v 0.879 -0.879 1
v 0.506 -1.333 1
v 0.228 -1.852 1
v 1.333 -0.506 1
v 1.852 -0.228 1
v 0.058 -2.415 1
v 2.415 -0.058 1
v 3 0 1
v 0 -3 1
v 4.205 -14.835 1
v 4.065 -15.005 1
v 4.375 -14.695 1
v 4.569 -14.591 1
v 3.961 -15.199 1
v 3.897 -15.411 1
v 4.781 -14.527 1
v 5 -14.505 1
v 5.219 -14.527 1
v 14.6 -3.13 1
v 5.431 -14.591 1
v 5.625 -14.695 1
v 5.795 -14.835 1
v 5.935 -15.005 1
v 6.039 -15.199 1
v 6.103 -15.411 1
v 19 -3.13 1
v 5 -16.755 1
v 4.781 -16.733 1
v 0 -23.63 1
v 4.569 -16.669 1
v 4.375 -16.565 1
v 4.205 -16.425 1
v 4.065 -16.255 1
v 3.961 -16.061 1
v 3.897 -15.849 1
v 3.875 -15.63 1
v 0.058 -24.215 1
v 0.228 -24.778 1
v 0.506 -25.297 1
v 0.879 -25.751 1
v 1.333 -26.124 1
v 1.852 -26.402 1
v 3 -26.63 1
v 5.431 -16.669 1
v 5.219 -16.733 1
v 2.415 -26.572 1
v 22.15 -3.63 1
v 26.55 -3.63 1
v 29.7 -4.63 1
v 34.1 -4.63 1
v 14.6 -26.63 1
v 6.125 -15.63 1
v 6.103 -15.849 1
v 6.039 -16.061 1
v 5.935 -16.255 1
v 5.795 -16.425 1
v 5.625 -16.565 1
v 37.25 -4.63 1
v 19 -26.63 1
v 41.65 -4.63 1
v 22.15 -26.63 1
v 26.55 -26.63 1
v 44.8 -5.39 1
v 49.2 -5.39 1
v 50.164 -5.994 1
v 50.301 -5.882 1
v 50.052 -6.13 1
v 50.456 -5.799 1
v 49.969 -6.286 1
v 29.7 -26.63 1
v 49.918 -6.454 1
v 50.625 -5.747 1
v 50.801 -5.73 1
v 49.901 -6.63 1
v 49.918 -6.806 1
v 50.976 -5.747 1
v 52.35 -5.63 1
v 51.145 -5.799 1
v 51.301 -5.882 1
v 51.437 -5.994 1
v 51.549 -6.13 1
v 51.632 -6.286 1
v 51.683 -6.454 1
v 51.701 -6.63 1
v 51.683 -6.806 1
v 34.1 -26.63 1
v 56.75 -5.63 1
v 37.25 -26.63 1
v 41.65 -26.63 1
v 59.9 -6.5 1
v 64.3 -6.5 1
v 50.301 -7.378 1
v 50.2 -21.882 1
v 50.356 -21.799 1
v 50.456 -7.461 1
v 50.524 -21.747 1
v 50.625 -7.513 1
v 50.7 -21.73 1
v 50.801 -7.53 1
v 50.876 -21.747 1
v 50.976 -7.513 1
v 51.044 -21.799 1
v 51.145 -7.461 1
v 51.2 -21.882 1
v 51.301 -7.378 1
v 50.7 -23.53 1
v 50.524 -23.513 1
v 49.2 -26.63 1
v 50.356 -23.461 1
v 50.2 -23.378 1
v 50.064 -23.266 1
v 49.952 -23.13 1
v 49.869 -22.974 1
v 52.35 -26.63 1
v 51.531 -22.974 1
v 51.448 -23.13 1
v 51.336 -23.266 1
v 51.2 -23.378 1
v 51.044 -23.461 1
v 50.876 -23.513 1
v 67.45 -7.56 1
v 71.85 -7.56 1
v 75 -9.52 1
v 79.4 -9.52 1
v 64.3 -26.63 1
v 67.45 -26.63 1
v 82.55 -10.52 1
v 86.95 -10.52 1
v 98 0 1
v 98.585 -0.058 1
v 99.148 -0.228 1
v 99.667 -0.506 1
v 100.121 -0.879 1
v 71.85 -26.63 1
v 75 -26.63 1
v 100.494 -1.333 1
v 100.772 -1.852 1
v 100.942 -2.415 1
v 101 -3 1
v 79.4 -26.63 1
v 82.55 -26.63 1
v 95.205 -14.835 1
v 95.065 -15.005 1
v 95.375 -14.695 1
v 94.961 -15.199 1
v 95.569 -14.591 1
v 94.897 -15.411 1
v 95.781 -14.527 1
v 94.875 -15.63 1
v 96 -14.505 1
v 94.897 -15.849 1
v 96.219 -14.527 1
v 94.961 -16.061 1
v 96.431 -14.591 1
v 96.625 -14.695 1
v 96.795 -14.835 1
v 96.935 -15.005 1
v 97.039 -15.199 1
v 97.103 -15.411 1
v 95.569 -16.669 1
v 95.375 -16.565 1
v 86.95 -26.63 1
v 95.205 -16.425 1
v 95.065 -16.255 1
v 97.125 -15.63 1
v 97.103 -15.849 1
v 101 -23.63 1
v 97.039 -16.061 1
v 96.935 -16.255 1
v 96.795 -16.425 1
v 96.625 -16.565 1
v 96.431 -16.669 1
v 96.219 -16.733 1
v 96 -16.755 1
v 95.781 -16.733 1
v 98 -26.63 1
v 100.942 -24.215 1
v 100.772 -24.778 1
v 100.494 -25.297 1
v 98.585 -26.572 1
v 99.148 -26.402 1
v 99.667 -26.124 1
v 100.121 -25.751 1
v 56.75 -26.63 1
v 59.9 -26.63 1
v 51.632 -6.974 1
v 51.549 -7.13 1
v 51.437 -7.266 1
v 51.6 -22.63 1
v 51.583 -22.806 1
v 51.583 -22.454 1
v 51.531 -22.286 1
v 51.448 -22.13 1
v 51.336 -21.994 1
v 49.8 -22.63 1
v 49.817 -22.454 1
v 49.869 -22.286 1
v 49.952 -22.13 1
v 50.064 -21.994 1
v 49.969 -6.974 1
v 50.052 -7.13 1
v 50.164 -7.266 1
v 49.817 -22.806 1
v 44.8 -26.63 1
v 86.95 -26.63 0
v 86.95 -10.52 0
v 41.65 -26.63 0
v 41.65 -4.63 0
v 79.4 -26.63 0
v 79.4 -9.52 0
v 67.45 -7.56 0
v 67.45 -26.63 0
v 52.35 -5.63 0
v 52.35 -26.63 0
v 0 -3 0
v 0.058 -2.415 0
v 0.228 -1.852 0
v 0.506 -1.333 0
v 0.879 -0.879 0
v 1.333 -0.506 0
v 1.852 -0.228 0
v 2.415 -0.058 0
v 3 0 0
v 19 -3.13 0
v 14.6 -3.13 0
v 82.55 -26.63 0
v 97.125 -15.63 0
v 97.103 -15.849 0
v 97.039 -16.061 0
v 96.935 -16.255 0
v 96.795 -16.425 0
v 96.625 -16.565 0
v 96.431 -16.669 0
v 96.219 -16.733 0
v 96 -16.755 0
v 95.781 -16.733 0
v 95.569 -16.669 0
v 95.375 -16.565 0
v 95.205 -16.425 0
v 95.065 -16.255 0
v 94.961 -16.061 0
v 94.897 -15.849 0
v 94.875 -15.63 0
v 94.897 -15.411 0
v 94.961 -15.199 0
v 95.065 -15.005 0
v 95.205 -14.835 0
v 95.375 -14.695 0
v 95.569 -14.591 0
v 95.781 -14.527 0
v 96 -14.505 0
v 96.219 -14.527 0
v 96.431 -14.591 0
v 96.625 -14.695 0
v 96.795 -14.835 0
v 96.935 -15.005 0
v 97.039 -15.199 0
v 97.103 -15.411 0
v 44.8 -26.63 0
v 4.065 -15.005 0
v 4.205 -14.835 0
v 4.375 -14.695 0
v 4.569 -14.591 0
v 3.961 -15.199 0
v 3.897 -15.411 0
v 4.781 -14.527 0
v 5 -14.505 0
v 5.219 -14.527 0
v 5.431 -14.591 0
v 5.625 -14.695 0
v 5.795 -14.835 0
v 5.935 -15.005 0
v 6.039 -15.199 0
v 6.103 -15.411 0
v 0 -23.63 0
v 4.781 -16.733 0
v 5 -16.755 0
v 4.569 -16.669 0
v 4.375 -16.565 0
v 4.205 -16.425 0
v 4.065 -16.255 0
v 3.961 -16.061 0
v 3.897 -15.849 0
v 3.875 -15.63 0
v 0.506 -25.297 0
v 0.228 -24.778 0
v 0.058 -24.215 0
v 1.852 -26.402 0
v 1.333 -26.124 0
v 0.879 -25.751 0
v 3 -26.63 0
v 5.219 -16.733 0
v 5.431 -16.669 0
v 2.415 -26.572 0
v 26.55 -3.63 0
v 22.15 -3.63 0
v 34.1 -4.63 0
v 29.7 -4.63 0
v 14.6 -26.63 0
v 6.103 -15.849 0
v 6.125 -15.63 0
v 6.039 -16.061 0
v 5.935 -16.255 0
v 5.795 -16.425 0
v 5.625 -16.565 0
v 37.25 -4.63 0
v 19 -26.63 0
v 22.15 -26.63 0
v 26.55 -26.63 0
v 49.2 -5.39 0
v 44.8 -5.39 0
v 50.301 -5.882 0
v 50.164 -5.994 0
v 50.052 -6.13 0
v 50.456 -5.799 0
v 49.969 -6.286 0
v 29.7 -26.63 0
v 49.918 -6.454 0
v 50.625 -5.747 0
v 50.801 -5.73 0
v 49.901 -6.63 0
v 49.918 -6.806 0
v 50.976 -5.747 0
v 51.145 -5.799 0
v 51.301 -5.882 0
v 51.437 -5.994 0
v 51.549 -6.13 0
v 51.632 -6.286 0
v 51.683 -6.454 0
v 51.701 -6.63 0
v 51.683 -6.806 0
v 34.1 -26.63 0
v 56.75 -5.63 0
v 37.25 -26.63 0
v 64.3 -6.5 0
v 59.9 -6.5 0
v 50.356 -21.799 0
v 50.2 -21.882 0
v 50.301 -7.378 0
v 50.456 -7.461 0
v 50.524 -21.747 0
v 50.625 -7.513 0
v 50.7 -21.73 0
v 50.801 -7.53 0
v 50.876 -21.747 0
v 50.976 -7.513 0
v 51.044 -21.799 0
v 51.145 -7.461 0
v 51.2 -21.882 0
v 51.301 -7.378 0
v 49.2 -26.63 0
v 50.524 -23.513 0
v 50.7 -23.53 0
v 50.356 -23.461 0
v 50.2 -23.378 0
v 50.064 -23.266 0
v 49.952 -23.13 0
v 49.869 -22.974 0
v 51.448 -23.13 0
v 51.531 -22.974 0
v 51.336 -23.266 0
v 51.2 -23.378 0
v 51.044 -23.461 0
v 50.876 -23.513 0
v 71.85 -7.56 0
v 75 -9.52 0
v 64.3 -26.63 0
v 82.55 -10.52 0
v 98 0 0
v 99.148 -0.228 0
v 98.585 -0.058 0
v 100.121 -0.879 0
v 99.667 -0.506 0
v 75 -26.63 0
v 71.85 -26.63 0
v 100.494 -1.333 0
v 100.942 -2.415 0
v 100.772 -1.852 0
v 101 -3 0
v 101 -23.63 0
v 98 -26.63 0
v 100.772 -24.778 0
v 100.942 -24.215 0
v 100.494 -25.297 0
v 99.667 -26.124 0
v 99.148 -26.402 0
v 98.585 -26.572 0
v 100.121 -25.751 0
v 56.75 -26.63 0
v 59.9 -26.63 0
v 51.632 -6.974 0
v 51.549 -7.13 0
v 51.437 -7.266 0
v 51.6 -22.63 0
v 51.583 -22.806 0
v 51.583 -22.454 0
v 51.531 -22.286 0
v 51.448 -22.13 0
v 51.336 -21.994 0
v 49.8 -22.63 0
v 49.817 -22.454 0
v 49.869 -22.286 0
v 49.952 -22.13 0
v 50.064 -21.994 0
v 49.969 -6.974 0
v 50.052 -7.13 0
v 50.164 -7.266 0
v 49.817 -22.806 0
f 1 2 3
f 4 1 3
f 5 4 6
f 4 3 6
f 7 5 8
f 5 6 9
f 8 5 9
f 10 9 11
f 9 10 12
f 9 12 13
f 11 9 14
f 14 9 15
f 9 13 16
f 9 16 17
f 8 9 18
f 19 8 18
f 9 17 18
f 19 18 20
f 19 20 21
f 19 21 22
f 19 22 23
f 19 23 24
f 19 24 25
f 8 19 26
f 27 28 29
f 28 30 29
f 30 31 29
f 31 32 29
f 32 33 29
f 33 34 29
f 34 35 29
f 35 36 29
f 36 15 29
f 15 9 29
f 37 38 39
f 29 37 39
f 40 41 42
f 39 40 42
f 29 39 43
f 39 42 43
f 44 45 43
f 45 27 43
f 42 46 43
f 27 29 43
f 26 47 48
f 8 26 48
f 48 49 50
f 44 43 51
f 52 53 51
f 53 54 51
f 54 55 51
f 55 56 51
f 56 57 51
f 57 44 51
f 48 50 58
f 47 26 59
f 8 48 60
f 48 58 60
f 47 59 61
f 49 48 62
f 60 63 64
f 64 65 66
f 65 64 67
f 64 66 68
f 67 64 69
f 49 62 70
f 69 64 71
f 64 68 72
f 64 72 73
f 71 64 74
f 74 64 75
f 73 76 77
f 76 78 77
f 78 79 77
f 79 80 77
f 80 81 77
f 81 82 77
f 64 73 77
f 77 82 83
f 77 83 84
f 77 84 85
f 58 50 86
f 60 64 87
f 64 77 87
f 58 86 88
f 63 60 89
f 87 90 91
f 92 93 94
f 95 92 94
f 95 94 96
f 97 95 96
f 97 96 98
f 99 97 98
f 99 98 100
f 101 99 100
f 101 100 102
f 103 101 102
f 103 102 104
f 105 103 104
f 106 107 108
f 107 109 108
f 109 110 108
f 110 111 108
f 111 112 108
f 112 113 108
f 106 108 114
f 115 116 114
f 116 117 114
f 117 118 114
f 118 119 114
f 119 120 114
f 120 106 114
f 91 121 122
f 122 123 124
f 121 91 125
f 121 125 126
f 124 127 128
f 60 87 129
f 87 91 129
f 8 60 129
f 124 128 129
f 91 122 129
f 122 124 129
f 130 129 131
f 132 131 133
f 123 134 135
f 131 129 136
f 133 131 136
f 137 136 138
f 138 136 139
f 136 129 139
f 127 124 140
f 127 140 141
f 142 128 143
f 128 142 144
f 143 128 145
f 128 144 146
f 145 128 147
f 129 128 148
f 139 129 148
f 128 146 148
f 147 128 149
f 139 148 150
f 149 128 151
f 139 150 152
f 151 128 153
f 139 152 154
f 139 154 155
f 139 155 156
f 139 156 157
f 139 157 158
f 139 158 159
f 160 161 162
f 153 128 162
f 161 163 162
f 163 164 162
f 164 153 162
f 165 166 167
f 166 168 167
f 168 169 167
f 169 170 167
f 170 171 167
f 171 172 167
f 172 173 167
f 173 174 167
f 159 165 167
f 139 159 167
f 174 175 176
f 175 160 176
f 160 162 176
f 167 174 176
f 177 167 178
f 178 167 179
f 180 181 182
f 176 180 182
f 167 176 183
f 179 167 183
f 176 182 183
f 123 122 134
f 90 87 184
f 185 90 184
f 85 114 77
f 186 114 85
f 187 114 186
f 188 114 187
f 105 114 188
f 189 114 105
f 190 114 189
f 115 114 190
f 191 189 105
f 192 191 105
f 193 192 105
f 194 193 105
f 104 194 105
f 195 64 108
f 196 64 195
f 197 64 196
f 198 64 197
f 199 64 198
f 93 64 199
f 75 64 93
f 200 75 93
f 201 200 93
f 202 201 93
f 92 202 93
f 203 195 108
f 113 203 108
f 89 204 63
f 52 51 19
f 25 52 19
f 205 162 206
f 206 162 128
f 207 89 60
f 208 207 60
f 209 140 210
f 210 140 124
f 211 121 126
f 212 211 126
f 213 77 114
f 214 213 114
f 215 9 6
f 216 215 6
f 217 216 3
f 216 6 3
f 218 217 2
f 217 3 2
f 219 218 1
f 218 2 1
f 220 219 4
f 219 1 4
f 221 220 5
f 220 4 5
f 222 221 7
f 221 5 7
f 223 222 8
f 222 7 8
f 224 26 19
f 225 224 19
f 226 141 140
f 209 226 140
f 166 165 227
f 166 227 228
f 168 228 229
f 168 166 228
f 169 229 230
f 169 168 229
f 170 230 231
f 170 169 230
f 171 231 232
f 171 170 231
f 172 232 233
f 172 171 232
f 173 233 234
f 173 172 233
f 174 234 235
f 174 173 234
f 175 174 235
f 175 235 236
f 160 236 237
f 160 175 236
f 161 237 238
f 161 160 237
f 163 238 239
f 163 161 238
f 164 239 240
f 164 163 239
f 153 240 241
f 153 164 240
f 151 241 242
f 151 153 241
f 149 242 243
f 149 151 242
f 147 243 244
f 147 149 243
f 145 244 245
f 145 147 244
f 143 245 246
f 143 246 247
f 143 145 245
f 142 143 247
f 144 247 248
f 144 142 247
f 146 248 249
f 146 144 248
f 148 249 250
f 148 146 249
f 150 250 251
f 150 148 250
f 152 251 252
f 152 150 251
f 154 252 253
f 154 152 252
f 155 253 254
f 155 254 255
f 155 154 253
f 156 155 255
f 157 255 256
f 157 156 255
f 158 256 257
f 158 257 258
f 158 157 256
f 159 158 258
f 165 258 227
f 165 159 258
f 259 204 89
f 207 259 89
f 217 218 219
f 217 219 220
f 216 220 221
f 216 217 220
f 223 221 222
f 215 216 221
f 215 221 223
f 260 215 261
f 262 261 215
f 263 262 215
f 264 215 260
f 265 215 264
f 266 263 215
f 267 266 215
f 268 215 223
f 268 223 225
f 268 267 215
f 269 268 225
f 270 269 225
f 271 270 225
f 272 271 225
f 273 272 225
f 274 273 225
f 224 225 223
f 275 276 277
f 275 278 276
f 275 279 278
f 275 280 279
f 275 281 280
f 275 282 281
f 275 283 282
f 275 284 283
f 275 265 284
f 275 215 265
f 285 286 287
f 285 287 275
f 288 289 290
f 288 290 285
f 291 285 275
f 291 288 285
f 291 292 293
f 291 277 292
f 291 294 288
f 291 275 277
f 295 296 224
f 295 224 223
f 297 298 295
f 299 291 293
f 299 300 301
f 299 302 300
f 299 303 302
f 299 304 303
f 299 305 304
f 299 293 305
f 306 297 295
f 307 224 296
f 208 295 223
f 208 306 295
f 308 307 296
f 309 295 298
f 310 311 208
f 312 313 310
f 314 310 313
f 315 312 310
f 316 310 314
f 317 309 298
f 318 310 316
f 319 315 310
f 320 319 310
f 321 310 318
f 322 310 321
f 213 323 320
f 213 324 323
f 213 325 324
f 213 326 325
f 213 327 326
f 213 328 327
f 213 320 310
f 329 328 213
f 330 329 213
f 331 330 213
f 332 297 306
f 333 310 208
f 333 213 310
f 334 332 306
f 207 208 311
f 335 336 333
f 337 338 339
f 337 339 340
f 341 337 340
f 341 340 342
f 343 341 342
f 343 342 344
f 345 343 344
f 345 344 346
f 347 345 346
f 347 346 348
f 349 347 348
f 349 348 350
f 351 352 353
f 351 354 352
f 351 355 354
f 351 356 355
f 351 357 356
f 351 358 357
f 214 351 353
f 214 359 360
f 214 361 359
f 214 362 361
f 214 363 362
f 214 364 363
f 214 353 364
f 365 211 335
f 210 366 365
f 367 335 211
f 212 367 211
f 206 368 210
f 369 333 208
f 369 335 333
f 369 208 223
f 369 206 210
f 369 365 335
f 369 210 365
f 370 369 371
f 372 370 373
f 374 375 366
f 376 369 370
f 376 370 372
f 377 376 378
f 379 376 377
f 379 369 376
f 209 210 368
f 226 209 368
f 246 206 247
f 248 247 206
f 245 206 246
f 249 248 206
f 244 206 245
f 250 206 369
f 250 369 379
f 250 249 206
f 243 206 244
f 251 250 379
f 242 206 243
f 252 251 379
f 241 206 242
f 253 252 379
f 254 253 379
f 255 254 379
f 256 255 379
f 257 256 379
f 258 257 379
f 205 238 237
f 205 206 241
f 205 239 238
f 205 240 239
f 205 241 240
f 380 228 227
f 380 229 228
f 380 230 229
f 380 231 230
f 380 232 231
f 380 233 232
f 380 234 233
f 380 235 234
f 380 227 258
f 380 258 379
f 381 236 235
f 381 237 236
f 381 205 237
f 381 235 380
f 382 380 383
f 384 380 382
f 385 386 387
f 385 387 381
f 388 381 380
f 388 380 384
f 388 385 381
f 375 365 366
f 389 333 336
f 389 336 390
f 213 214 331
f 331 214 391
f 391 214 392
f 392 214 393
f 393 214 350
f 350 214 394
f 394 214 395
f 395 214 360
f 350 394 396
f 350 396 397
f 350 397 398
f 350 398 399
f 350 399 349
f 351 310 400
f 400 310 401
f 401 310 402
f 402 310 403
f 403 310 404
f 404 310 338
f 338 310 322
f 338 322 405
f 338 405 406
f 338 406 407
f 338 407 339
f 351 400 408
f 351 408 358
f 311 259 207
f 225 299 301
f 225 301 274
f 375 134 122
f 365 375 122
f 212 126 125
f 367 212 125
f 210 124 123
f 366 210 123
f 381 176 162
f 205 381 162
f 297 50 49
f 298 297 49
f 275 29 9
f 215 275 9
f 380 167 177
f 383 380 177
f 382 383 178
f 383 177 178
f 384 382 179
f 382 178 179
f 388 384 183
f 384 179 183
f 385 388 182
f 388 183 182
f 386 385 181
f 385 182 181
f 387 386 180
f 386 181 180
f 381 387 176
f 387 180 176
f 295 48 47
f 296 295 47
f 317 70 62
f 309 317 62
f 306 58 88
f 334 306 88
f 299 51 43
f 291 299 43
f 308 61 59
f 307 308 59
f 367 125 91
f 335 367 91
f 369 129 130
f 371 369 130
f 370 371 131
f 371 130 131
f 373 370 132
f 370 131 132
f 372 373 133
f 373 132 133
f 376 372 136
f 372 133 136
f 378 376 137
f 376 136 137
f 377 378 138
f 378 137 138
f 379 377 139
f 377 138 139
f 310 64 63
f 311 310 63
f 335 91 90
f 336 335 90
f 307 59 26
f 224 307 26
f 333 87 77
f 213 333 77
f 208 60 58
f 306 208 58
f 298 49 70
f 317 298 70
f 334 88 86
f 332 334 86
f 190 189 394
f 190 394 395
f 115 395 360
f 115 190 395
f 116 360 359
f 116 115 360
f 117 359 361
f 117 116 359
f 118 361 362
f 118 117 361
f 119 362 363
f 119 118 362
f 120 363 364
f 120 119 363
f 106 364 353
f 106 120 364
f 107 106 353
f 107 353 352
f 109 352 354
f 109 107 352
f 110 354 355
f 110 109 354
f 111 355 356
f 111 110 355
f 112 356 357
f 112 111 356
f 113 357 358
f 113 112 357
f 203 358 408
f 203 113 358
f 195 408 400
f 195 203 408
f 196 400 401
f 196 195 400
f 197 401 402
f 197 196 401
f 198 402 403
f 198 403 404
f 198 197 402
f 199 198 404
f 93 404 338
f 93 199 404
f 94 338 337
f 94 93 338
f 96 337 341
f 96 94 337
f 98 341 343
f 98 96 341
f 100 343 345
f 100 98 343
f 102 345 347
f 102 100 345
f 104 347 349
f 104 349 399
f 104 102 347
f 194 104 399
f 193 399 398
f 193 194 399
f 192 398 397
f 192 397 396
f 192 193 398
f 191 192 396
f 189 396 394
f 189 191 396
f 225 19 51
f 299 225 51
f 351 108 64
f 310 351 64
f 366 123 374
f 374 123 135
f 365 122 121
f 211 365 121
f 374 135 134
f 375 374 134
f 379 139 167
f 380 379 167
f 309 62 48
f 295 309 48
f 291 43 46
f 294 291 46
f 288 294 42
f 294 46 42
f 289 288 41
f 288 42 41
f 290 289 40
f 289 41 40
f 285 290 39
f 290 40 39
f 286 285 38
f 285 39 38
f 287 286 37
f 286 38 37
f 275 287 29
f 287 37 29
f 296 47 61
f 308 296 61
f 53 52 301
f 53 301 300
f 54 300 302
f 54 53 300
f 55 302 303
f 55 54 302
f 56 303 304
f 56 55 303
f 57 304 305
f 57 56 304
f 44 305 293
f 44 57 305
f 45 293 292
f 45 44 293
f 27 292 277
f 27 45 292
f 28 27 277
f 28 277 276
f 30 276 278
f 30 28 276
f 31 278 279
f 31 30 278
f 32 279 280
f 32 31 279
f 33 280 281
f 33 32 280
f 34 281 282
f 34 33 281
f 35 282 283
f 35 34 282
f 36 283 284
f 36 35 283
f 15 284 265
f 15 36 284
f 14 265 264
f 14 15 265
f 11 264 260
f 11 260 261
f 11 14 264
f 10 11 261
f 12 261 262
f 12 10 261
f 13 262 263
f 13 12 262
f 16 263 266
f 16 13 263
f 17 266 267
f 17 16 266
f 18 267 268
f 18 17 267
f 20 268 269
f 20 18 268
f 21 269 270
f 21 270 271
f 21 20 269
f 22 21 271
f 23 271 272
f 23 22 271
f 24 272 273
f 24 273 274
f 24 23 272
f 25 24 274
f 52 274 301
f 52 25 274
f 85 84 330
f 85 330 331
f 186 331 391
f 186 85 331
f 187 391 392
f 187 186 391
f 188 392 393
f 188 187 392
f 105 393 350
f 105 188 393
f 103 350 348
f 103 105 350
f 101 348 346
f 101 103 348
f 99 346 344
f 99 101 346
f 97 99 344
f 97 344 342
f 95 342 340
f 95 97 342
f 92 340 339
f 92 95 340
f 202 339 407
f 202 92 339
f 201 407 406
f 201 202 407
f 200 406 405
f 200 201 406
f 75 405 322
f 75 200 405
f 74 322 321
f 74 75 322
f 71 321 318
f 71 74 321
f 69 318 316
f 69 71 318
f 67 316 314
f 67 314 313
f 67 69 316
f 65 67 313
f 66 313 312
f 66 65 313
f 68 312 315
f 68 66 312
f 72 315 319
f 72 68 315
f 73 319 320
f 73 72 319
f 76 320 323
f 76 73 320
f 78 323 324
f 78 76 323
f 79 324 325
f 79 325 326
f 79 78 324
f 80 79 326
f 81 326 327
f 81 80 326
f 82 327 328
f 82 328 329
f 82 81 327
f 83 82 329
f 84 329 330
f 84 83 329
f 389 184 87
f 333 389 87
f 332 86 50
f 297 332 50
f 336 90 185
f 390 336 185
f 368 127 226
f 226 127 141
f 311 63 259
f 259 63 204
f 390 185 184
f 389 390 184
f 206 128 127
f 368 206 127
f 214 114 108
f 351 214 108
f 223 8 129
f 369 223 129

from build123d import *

# Parameters (mm, degrees)
F0_R     = 0.9
F0_R_2   = 1.125
F1_DEPTH = 1
F2_ANGLE = 90
F3_ANGLE = -90


with BuildPart() as f1:
    # F0 (on Right) → F1 (new body)
    with BuildSketch(Plane.YZ):
        with BuildLine():
            ThreePointArc((0, 3), (0.87868, 0.87868), (3, 0))
            Line((3, 0), (98, 0))
            ThreePointArc((98, 0), (100.12132, 0.87868), (101, 3))
            Line((101, 3), (101, 23.63))
            ThreePointArc((101, 23.63), (100.12132, 25.75132), (98, 26.63))
            Line((98, 26.63), (86.95, 26.63))
            Line((86.95, 26.63), (86.95, 10.52))
            Line((86.95, 10.52), (82.55, 10.52))
            Line((82.55, 10.52), (82.55, 26.63))
            Line((82.55, 26.63), (79.4, 26.63))
            Line((79.4, 26.63), (79.4, 9.52))
            Line((79.4, 9.52), (75, 9.52))
            Line((75, 9.52), (75, 26.63))
            Line((75, 26.63), (71.85, 26.63))
            Line((71.85, 26.63), (71.85, 7.56))
            Line((71.85, 7.56), (67.45, 7.56))
            Line((67.45, 7.56), (67.45, 26.63))
            Line((67.45, 26.63), (64.3, 26.63))
            Line((64.3, 26.63), (64.3, 6.5))
            Line((64.3, 6.5), (59.9, 6.5))
            Line((59.9, 6.5), (59.9, 26.63))
            Line((59.9, 26.63), (56.75, 26.63))
            Line((56.75, 26.63), (56.75, 5.63))
            Line((56.75, 5.63), (52.35, 5.63))
            Line((52.35, 5.63), (52.35, 26.63))
            Line((52.35, 26.63), (49.2, 26.63))
            Line((49.2, 26.63), (49.2, 5.39))
            Line((49.2, 5.39), (44.8, 5.39))
            Line((44.8, 5.39), (44.8, 26.63))
            Line((44.8, 26.63), (41.65, 26.63))
            Line((41.65, 26.63), (41.65, 4.63))
            Line((41.65, 4.63), (37.25, 4.63))
            Line((37.25, 4.63), (37.25, 26.63))
            Line((37.25, 26.63), (34.1, 26.63))
            Line((34.1, 26.63), (34.1, 4.63))
            Line((34.1, 4.63), (29.7, 4.63))
            Line((29.7, 4.63), (29.7, 26.63))
            Line((29.7, 26.63), (26.55, 26.63))
            Line((26.55, 26.63), (26.55, 3.63))
            Line((26.55, 3.63), (22.15, 3.63))
            Line((22.15, 3.63), (22.15, 26.63))
            Line((22.15, 26.63), (19, 26.63))
            Line((19, 26.63), (19, 3.13))
            Line((19, 3.13), (14.6, 3.13))
            Line((14.6, 3.13), (14.6, 26.63))
            Line((14.6, 26.63), (3, 26.63))
            ThreePointArc((3, 26.63), (0.87868, 25.75132), (0, 23.63))
            Line((0, 23.63), (0, 3))
        make_face()
        with Locations((50.800736, 6.63)):
            Circle(F0_R, mode=Mode.SUBTRACT)
        with Locations((5, 15.63)):
            Circle(F0_R_2, mode=Mode.SUBTRACT)
        with Locations((96, 15.63)):
            Circle(F0_R_2, mode=Mode.SUBTRACT)
        with Locations((50.7, 22.63)):
            Circle(F0_R, mode=Mode.SUBTRACT)
    extrude(amount=F1_DEPTH)


with BuildPart() as f1_1:
    # F2: moved
    add(f1.part.rotate(Axis((1, 50.5, 0), (0, 1, 0)), F2_ANGLE))


with BuildPart() as f1_2:
    # F3: moved
    add(f1_1.part.rotate(Axis((4, 3, 1), (0, 0, 1)), F3_ANGLE))


with BuildPart() as f1_3:
    # F4: moved
    add(f1_2.part.moved(Location((0, -6, 0))))


with BuildPart() as f1_4:
    # F5: moved
    add(f1_3.part.moved(Location((-1, 0, 0))))


solid = f1_4.part
